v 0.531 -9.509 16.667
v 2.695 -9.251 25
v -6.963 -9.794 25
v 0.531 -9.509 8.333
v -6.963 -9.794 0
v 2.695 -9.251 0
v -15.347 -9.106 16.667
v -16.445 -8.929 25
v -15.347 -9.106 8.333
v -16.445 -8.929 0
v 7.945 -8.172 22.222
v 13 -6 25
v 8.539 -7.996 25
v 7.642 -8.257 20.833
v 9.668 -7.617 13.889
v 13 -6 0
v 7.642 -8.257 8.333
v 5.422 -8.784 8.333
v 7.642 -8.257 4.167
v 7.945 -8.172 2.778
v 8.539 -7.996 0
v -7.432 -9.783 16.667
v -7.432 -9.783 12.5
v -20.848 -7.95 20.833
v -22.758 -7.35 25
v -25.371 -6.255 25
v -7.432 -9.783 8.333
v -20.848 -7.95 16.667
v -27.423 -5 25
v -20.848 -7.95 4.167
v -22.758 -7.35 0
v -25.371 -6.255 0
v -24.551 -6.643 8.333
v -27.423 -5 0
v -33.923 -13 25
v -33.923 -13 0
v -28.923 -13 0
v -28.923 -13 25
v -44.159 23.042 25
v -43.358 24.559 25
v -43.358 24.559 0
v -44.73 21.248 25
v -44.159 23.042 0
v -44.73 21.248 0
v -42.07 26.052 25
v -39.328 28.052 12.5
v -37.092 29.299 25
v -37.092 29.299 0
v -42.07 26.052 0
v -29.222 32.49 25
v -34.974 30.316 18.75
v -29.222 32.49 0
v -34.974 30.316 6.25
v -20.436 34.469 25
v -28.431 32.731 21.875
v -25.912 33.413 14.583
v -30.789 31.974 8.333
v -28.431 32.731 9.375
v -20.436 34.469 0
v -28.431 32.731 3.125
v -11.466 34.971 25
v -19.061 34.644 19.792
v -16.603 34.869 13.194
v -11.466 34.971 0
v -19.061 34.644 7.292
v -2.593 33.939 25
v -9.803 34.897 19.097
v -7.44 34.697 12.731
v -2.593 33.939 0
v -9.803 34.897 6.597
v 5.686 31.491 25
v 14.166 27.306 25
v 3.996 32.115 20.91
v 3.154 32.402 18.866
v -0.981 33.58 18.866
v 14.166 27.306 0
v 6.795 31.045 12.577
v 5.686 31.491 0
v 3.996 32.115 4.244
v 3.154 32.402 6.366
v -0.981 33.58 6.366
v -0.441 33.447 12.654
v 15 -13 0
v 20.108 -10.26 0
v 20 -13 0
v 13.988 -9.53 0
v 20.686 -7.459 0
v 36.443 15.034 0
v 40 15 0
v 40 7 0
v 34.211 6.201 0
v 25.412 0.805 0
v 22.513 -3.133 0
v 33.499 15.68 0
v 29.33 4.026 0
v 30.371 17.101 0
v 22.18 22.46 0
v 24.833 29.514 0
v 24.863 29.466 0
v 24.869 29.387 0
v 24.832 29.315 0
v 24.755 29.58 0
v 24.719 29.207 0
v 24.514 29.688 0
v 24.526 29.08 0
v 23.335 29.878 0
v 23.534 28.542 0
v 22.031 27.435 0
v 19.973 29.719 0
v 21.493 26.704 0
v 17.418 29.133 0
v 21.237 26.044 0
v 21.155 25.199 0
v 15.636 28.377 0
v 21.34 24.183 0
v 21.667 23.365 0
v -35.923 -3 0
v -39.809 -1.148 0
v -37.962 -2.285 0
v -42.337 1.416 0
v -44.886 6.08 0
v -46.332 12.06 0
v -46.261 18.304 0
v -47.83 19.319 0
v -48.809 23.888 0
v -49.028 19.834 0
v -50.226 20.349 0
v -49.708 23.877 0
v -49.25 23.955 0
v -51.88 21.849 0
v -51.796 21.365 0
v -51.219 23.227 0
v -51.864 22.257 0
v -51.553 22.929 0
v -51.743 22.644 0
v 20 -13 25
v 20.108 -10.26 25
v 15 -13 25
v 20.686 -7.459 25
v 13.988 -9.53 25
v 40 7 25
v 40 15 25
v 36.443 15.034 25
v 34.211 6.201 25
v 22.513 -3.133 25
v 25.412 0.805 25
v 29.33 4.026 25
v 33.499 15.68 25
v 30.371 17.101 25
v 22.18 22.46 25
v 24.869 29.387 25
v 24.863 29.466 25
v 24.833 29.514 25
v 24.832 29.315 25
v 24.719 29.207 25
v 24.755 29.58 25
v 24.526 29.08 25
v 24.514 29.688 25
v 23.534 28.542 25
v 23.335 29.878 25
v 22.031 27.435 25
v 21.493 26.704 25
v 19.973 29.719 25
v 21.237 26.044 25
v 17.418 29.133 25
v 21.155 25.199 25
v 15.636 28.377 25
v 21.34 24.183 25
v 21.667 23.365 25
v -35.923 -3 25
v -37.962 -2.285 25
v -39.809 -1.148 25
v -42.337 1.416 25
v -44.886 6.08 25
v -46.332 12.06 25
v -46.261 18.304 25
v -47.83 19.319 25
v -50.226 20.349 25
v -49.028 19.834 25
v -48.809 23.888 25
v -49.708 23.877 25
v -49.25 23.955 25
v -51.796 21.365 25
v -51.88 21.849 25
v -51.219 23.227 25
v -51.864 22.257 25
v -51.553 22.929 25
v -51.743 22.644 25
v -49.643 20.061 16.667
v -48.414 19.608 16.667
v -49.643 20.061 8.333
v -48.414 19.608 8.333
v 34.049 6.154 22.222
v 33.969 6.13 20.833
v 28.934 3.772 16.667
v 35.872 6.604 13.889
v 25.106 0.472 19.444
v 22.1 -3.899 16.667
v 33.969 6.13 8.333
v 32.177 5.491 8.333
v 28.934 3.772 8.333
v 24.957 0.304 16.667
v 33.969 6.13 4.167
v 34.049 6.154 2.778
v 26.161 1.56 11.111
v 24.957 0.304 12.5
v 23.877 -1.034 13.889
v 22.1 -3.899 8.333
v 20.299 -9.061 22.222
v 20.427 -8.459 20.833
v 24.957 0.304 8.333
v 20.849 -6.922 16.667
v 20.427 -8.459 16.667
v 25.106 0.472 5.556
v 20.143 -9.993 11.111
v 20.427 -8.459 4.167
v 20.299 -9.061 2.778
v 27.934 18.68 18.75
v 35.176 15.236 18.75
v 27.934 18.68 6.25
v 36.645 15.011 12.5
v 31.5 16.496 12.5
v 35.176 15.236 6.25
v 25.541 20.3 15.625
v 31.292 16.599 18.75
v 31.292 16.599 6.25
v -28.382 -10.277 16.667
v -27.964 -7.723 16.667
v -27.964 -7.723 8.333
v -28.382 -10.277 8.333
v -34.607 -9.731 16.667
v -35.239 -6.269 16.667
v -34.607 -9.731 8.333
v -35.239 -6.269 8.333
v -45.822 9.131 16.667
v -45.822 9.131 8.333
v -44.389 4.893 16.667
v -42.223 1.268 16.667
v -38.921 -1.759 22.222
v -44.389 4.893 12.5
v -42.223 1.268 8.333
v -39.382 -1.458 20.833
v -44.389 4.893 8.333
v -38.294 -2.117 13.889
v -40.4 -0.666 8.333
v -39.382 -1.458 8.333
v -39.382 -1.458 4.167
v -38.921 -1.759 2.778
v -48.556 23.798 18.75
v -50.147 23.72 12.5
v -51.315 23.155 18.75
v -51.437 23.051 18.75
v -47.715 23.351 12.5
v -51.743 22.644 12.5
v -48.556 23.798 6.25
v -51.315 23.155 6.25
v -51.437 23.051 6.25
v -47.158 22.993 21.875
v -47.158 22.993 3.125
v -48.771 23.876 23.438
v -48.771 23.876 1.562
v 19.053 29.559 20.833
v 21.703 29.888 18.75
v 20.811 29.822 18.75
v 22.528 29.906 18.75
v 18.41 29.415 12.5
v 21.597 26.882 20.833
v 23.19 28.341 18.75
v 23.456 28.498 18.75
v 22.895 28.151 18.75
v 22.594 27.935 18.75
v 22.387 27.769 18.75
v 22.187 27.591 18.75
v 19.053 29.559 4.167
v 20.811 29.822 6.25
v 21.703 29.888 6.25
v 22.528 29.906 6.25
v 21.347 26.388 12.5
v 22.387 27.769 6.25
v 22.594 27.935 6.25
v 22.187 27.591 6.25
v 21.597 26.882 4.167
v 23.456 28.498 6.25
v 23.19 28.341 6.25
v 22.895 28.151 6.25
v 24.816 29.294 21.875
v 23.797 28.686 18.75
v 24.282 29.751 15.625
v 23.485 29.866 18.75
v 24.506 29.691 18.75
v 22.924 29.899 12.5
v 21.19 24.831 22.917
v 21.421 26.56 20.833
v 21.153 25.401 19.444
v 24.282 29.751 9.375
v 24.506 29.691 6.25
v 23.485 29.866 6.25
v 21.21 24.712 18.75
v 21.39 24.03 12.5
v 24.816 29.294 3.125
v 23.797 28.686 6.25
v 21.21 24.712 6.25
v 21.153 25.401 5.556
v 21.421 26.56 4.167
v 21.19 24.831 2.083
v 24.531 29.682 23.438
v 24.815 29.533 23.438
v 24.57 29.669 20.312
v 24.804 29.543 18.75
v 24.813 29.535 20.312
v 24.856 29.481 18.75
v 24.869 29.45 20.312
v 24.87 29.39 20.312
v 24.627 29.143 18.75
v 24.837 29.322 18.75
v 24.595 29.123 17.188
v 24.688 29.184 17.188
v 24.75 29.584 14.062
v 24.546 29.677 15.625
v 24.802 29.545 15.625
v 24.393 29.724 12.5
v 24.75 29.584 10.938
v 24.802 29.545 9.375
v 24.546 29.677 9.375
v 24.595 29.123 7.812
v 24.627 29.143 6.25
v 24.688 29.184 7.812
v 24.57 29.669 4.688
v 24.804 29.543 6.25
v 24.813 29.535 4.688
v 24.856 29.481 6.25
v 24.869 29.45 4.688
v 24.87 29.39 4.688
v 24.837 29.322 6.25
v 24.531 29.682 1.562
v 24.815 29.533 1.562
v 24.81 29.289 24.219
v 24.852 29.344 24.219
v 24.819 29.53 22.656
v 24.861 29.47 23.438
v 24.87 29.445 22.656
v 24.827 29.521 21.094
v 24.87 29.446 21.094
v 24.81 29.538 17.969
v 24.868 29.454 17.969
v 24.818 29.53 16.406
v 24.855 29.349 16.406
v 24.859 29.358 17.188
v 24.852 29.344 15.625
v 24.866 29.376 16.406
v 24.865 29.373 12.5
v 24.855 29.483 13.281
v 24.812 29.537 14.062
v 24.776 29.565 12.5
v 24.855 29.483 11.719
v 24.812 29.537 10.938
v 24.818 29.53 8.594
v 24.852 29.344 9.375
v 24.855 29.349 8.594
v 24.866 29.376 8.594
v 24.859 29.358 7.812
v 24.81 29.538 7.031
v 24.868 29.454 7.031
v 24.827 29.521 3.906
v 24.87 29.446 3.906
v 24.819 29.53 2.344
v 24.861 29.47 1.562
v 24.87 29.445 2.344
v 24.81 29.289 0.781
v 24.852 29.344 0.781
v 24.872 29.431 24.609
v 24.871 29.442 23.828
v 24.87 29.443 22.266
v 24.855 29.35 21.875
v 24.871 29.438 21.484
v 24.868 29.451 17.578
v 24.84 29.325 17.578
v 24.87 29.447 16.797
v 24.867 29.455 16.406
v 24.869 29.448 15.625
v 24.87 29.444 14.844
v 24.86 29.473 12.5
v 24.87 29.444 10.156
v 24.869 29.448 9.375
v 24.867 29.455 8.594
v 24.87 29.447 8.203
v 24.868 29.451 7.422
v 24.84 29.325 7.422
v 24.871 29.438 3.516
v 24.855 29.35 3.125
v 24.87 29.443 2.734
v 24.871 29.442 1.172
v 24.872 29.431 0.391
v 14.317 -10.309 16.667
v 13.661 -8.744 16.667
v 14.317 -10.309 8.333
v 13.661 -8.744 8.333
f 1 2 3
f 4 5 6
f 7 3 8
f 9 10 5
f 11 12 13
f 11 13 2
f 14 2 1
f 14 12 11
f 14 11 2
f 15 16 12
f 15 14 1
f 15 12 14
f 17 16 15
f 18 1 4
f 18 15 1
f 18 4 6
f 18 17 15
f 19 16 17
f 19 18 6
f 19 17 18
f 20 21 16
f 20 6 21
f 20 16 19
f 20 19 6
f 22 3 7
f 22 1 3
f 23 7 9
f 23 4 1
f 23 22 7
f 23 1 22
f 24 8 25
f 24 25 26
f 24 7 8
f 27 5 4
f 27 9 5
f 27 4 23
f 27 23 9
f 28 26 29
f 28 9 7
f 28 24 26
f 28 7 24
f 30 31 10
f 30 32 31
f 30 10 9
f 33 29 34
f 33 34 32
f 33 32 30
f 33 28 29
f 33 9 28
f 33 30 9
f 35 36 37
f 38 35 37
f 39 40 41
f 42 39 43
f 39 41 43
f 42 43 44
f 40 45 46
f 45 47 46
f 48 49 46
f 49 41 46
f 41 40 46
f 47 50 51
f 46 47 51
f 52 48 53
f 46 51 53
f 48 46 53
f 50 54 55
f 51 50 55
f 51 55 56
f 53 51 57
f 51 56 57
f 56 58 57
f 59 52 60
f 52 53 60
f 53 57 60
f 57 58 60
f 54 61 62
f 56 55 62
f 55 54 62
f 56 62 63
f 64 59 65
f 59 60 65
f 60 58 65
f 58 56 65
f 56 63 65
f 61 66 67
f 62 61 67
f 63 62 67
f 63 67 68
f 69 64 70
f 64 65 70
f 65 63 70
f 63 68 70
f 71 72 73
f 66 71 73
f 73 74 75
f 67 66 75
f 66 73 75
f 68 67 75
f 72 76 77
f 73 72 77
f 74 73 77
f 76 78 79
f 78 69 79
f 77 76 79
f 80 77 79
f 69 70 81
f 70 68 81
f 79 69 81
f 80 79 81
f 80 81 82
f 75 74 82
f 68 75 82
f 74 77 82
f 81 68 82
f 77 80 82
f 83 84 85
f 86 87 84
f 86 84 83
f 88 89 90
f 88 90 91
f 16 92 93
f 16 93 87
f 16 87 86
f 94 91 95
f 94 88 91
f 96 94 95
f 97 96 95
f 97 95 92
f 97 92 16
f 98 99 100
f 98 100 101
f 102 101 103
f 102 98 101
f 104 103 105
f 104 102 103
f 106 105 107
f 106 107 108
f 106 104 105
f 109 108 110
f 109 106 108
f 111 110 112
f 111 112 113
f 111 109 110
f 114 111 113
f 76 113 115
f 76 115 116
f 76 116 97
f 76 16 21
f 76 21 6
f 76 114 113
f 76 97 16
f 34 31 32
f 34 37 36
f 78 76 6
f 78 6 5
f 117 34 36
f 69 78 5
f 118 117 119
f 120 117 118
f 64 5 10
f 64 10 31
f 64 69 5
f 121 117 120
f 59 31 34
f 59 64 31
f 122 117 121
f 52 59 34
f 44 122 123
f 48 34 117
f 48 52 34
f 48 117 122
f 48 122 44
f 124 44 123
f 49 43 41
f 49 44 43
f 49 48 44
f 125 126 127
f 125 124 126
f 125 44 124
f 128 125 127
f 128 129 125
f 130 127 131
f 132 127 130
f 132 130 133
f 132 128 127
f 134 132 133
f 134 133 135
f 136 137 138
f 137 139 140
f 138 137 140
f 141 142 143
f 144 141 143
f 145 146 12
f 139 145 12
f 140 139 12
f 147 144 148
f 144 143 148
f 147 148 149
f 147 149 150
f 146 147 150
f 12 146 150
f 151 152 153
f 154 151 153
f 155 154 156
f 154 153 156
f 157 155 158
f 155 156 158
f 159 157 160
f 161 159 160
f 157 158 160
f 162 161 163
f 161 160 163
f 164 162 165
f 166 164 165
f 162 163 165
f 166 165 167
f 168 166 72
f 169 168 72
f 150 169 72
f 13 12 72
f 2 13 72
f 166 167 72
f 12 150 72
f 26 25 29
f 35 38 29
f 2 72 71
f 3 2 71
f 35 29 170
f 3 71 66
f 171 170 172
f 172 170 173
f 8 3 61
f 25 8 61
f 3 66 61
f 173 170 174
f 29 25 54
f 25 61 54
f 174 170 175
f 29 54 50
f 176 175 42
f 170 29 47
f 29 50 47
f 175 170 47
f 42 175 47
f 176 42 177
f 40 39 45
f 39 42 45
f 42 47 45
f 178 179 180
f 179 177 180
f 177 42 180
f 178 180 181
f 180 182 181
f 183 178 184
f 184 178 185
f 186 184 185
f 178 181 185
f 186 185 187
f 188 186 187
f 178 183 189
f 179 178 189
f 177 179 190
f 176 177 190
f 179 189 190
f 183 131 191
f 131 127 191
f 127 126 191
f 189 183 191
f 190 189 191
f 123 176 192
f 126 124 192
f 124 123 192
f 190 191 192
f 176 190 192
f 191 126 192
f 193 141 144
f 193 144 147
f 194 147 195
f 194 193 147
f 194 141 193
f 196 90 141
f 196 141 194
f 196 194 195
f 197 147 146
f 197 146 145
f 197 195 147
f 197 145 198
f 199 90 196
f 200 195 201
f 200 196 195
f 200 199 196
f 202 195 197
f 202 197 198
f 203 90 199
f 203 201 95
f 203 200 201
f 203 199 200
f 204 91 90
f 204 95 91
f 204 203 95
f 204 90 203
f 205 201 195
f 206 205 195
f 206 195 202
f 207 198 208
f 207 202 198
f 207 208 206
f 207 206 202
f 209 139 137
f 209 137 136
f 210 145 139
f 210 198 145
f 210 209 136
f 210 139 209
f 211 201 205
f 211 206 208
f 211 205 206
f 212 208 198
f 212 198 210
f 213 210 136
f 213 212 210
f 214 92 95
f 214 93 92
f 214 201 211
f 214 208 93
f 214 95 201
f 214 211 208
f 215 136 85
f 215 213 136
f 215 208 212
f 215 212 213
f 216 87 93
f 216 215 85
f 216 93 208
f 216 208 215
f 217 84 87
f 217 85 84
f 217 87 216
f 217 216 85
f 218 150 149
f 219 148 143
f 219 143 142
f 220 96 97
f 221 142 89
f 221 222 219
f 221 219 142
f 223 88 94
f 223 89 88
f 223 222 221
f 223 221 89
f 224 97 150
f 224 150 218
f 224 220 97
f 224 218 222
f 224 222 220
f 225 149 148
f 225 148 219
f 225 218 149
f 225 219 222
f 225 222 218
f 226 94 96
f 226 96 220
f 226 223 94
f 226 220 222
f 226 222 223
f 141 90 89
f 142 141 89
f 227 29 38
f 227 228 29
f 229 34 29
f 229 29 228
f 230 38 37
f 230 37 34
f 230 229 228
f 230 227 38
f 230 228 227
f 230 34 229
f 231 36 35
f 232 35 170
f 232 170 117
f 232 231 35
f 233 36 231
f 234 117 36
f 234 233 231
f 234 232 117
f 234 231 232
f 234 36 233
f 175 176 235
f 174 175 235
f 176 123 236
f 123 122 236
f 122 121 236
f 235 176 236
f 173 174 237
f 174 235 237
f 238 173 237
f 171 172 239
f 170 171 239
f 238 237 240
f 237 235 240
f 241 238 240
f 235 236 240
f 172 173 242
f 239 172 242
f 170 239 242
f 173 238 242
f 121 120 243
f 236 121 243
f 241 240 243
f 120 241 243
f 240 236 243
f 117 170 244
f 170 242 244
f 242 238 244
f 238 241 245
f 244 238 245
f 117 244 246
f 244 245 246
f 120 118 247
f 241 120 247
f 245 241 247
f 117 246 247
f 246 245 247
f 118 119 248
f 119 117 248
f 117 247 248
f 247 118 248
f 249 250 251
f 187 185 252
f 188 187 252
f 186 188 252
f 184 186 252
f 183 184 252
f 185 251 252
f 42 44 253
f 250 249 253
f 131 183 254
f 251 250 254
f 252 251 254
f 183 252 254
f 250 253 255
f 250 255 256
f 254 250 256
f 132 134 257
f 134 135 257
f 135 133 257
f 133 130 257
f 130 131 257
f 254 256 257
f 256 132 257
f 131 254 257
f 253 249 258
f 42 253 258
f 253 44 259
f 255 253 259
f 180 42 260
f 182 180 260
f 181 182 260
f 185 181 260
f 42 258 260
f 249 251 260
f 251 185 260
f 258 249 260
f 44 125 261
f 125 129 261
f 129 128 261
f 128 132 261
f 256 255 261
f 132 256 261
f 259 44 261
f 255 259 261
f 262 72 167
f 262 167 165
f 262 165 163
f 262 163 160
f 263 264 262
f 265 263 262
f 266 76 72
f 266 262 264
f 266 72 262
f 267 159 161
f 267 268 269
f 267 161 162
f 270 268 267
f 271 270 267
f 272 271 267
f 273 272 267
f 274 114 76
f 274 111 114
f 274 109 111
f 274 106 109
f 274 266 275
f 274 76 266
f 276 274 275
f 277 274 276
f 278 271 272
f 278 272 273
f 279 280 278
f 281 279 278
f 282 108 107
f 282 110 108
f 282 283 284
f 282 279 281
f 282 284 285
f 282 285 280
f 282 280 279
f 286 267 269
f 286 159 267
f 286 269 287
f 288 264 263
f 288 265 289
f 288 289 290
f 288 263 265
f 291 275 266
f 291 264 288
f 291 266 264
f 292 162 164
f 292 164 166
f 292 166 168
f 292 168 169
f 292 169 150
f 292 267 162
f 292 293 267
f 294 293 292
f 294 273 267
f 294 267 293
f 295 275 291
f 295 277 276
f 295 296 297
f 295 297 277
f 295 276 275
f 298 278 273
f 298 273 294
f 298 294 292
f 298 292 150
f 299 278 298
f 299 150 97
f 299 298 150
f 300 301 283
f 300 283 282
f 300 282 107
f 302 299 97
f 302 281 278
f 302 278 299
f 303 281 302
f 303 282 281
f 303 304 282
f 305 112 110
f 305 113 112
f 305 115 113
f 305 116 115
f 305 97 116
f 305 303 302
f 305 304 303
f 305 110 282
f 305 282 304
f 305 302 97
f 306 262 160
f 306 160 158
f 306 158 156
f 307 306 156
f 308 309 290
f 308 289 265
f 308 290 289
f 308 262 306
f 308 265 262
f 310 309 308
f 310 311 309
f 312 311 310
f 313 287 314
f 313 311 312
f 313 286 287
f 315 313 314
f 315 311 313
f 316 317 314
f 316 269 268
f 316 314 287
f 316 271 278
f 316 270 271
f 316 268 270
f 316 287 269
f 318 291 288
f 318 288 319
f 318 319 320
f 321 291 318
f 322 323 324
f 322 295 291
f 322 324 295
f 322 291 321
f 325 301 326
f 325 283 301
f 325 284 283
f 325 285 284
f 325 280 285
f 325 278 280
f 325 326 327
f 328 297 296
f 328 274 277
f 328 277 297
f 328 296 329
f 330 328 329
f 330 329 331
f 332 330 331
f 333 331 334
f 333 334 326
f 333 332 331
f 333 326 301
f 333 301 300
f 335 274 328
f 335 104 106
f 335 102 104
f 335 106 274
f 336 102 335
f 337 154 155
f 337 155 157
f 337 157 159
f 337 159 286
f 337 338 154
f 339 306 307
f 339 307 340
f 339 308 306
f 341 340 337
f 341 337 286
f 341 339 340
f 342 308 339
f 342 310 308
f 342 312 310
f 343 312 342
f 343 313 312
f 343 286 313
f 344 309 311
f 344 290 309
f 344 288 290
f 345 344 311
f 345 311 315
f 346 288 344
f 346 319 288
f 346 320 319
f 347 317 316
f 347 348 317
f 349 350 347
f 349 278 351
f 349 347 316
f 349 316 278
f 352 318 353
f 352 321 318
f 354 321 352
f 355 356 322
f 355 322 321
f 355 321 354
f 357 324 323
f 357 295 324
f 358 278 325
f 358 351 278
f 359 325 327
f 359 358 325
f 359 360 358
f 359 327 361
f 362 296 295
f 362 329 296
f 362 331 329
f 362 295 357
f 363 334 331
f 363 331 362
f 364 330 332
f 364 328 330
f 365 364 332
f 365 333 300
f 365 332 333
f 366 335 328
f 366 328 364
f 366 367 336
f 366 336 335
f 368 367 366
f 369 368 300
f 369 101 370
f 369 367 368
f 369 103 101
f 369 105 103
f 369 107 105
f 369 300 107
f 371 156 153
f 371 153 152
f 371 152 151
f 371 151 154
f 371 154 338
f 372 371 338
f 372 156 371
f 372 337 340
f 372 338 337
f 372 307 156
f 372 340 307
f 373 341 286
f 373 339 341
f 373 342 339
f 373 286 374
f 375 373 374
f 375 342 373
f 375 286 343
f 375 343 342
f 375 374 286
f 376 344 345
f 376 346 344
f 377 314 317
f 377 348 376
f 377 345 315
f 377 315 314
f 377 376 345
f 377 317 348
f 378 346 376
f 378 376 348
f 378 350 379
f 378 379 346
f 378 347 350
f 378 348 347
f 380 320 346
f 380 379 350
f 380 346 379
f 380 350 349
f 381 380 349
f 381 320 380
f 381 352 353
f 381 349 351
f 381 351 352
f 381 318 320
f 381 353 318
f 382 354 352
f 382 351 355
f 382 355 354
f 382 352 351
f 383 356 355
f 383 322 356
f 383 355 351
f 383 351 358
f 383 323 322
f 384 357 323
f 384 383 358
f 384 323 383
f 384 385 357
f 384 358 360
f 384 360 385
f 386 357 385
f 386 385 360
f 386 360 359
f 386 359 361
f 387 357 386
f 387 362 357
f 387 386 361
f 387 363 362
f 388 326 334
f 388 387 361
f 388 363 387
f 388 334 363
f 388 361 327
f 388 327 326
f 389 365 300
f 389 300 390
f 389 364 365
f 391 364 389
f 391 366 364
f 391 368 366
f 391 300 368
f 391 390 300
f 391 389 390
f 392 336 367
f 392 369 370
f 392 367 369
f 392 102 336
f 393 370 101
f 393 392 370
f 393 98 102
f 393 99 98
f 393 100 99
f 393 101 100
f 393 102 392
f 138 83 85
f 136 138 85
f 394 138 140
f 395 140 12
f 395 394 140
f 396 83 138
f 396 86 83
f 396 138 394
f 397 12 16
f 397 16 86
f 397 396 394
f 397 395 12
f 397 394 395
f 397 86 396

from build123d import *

# Parameters (mm, degrees)
F1_DEPTH = 25


with BuildPart() as f1:
    # F0 (on Top) → F1 (new body)
    with BuildSketch(Plane.XY):
        with BuildLine():
            add(Edge.make_bspline(
                [(14.1656817868, 27.306213975), (17.3286087811, 30.4327178746), (31.6137975279, 30.0063532795), (18.8594684005, 27.6065170765), (22.1804734319, 22.4600601941)],
                knots=[0, 0, 0, 0, 0.5479633402, 1, 1, 1, 1], degree=3))
            add(Edge.make_bspline(
                [(14.1656817868, 27.306213975), (-8.5522494737, 41.0188366673), (-39.7737865781, 30.0952229623), (-43.9671095669, 24.2991774614), (-44.7300113738, 21.2475694716)],
                knots=[0, 0, 0, 0, 0.7127719734, 1, 1, 1, 1], degree=3))
            add(Edge.make_bspline(
                [(-44.7300113738, 21.2475694716), (-48.86189571, 24.3265715696), (-49.0885533019, 24.0178126654), (-52.2380086043, 23.0147126637), (-51.7955087125, 21.3653277606)],
                knots=[0, 0, 0, 0, 0.5900294993, 1, 1, 1, 1], degree=3))
            add(Edge.make_bspline(
                [(-51.7955087125, 21.3653277606), (-48.5647395253, 19.0665111877), (-49.4916364551, 20.60242882), (-46.2608672678, 18.3036122471)],
                knots=[0, 0, 0, 0, 6.3250579291, 6.3250579291, 6.3250579291, 6.3250579291], degree=3))
            add(Edge.make_bspline(
                [(-46.2608672678, 18.3036122471), (-47.5562103093, 9.2362239957), (-43.4189804822, -1.28946384), (-35.9230783284, -3)],
                knots=[0, 0, 0, 0, 23.6793955779, 23.6793955779, 23.6793955779, 23.6793955779], degree=3))
            add(Edge.make_bspline(
                [(-33.9230783284, -13), (-34.668640544, -9.9556212891), (-35.1775161127, -6.0443787109), (-35.9230783284, -3)],
                knots=[0, 0, 0, 0, 10.1980390272, 10.1980390272, 10.1980390272, 10.1980390272], degree=3))
            Line((-33.9230783284, -13), (-28.9230783284, -13))
            add(Edge.make_bspline(
                [(-27.4230783284, -5), (-28.1065101524, -7.9201183158), (-28.2396465043, -10.0798816842), (-28.9230783284, -13)],
                knots=[0, 0, 0, 0, 8.139410298, 8.139410298, 8.139410298, 8.139410298], degree=3))
            add(Edge.make_bspline(
                [(13, -6), (4.6391610168, -11.534639582), (-19.6510312557, -10.8879149146), (-27.4230783284, -5)],
                knots=[0, 0, 0, 0, 40.4354456083, 40.4354456083, 40.4354456083, 40.4354456083], degree=3))
            add(Edge.make_bspline(
                [(15, -13), (14.2919536982, -8.9771856461), (13.6755976176, -10.1018498154), (13, -6)],
                knots=[0, 0, 0, 0, 7.2801098893, 7.2801098893, 7.2801098893, 7.2801098893], degree=3))
            Line((15, -13), (20, -13))
            add(Edge.make_bspline(
                [(40, 7), (26.9847903401, 6.9988165051), (19.5660162717, -4.1882214136), (20, -13)],
                knots=[0, 0, 0, 0, 28.2842712475, 28.2842712475, 28.2842712475, 28.2842712475], degree=3))
            Line((40, 7), (40, 15))
            add(Edge.make_bspline(
                [(22.1804734319, 22.4600601941), (27.4946360239, 19.1590298385), (30.5225928081, 16.3522606442), (36.3506581023, 14.6711683593), (40, 15)],
                knots=[0, 0, 0, 0, 0.5310169422, 1, 1, 1, 1], degree=3))
        make_face()
    extrude(amount=F1_DEPTH)


solid = f1.part
